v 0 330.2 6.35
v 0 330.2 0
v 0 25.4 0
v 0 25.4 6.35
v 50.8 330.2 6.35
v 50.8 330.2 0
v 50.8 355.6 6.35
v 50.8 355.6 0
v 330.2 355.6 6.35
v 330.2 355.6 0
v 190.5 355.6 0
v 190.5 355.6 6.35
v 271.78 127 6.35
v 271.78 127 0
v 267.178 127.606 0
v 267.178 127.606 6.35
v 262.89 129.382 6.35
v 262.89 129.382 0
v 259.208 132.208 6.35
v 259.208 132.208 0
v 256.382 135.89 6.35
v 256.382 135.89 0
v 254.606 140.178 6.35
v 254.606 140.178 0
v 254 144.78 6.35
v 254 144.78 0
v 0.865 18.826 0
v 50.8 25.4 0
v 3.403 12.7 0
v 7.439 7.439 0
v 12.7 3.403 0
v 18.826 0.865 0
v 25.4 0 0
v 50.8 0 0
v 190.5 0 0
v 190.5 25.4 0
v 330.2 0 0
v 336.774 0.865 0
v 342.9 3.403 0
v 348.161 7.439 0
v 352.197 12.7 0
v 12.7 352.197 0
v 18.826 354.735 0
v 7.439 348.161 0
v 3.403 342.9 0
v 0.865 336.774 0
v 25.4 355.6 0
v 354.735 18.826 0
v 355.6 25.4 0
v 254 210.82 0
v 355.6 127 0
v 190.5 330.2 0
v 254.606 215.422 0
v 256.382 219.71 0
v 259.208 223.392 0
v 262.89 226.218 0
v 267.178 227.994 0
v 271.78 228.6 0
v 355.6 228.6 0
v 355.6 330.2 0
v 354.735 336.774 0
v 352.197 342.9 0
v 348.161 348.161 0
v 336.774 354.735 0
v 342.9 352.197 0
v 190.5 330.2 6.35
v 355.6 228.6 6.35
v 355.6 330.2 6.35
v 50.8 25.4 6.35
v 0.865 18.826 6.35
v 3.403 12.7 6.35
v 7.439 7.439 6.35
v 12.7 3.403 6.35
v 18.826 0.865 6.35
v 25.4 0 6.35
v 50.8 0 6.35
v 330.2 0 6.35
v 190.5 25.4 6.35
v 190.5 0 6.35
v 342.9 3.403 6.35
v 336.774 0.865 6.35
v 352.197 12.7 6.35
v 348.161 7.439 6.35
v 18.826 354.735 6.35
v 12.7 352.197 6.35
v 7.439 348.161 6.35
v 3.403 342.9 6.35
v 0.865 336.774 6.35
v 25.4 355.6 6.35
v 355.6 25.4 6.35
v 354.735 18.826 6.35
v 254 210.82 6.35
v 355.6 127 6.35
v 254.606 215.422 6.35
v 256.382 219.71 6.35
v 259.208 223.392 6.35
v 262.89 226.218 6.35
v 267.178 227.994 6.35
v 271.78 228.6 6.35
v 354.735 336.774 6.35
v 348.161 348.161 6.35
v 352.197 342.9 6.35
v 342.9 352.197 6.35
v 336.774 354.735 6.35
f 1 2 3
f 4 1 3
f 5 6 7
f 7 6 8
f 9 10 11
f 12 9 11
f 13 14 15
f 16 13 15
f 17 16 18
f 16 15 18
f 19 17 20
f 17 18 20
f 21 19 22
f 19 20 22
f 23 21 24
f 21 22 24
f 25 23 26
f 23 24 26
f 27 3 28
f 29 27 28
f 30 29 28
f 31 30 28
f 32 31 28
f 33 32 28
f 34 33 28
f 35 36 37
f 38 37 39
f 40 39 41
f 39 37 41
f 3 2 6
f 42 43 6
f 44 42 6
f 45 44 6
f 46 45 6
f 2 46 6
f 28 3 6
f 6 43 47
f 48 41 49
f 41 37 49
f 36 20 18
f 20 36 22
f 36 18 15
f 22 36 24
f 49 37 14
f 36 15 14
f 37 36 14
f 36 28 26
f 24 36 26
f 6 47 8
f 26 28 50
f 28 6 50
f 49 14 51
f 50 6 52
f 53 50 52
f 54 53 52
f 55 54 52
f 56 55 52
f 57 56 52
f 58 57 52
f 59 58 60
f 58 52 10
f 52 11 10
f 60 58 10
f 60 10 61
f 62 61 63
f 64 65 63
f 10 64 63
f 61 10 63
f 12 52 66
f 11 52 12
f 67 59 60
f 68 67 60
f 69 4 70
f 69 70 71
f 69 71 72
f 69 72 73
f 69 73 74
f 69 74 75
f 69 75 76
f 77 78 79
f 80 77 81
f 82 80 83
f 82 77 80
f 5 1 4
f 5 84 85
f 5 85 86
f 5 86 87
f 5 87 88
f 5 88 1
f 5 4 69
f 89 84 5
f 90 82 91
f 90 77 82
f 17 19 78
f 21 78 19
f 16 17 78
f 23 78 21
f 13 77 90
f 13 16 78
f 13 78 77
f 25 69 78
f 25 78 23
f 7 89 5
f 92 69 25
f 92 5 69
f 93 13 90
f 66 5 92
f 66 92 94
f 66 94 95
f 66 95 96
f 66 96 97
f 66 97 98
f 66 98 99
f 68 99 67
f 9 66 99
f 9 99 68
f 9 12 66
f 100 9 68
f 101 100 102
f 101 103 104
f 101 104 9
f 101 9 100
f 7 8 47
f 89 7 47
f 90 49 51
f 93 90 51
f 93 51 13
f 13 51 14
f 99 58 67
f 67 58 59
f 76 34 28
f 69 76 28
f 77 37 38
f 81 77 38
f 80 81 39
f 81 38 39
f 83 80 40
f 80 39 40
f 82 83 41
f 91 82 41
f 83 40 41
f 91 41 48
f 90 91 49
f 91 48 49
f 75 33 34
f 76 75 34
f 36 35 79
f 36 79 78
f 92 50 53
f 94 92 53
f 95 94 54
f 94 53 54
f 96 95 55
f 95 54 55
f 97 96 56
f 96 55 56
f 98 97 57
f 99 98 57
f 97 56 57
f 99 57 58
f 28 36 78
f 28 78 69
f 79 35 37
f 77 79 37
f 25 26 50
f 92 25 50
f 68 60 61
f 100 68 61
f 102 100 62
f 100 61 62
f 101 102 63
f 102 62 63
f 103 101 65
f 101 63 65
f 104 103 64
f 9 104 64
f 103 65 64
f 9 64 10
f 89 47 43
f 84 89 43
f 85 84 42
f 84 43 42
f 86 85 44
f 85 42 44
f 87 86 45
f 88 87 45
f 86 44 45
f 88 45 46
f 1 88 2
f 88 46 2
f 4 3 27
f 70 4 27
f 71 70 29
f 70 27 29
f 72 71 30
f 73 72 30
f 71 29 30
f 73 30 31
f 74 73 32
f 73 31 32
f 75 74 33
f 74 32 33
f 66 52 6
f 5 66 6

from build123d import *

# Parameters (mm, degrees)
BOSS_EXTRUDE1_DEPTH = 6.35
SKETCH2_W           = 139.7
SKETCH2_H           = 25.4
CUT_EXTRUDE1_DEPTH  = 503.934431611
CUT_EXTRUDE2_DEPTH  = 503.934431611


with BuildPart() as part:
    # Sketch1 → Boss-Extrude1 (new body)
    with BuildSketch(Plane.XY):
        with BuildLine():
            Line((25.4, 0), (330.2, 0))
            ThreePointArc((330.2, 0), (348.160512242, 7.439487758), (355.6, 25.4))
            Line((355.6, 25.4), (355.6, 330.2))
            ThreePointArc((355.6, 330.2), (348.160512242, 348.160512242), (330.2, 355.6))
            Line((330.2, 355.6), (25.4, 355.6))
            ThreePointArc((25.4, 355.6), (7.439487758, 348.160512242), (0, 330.2))
            Line((0, 330.2), (0, 25.4))
            ThreePointArc((0, 25.4), (7.439487758, 7.439487758), (25.4, 0))
        make_face()
    extrude(amount=BOSS_EXTRUDE1_DEPTH)

    # Sketch2 → Cut-Extrude1 (cut, through all)
    with BuildSketch(Plane(origin=(0, 0, 0), x_dir=(-1, 0, 0), z_dir=(0, 0, -1))):
        with Locations((-120.65, 342.9)):
            Rectangle(SKETCH2_W, SKETCH2_H)
        with Locations((-120.65, 12.7)):
            Rectangle(SKETCH2_W, SKETCH2_H)
    extrude(amount=-CUT_EXTRUDE1_DEPTH, mode=Mode.SUBTRACT)

    # Sketch3 → Cut-Extrude2 (cut, through all)
    with BuildSketch(Plane(origin=(0, 0, 0), x_dir=(-1, 0, 0), z_dir=(0, 0, -1))):
        with BuildLine():
            Line((-355.6, 127), (-271.78, 127))
            ThreePointArc((-271.78, 127), (-259.207641431, 132.207641431), (-254, 144.78))
            Line((-254, 144.78), (-254, 210.82))
            ThreePointArc((-254, 210.82), (-259.207641431, 223.392358569), (-271.78, 228.6))
            Line((-271.78, 228.6), (-355.6, 228.6))
            Line((-355.6, 228.6), (-355.6, 127))
        make_face()
    extrude(amount=-CUT_EXTRUDE2_DEPTH, mode=Mode.SUBTRACT)


solid = part.part
